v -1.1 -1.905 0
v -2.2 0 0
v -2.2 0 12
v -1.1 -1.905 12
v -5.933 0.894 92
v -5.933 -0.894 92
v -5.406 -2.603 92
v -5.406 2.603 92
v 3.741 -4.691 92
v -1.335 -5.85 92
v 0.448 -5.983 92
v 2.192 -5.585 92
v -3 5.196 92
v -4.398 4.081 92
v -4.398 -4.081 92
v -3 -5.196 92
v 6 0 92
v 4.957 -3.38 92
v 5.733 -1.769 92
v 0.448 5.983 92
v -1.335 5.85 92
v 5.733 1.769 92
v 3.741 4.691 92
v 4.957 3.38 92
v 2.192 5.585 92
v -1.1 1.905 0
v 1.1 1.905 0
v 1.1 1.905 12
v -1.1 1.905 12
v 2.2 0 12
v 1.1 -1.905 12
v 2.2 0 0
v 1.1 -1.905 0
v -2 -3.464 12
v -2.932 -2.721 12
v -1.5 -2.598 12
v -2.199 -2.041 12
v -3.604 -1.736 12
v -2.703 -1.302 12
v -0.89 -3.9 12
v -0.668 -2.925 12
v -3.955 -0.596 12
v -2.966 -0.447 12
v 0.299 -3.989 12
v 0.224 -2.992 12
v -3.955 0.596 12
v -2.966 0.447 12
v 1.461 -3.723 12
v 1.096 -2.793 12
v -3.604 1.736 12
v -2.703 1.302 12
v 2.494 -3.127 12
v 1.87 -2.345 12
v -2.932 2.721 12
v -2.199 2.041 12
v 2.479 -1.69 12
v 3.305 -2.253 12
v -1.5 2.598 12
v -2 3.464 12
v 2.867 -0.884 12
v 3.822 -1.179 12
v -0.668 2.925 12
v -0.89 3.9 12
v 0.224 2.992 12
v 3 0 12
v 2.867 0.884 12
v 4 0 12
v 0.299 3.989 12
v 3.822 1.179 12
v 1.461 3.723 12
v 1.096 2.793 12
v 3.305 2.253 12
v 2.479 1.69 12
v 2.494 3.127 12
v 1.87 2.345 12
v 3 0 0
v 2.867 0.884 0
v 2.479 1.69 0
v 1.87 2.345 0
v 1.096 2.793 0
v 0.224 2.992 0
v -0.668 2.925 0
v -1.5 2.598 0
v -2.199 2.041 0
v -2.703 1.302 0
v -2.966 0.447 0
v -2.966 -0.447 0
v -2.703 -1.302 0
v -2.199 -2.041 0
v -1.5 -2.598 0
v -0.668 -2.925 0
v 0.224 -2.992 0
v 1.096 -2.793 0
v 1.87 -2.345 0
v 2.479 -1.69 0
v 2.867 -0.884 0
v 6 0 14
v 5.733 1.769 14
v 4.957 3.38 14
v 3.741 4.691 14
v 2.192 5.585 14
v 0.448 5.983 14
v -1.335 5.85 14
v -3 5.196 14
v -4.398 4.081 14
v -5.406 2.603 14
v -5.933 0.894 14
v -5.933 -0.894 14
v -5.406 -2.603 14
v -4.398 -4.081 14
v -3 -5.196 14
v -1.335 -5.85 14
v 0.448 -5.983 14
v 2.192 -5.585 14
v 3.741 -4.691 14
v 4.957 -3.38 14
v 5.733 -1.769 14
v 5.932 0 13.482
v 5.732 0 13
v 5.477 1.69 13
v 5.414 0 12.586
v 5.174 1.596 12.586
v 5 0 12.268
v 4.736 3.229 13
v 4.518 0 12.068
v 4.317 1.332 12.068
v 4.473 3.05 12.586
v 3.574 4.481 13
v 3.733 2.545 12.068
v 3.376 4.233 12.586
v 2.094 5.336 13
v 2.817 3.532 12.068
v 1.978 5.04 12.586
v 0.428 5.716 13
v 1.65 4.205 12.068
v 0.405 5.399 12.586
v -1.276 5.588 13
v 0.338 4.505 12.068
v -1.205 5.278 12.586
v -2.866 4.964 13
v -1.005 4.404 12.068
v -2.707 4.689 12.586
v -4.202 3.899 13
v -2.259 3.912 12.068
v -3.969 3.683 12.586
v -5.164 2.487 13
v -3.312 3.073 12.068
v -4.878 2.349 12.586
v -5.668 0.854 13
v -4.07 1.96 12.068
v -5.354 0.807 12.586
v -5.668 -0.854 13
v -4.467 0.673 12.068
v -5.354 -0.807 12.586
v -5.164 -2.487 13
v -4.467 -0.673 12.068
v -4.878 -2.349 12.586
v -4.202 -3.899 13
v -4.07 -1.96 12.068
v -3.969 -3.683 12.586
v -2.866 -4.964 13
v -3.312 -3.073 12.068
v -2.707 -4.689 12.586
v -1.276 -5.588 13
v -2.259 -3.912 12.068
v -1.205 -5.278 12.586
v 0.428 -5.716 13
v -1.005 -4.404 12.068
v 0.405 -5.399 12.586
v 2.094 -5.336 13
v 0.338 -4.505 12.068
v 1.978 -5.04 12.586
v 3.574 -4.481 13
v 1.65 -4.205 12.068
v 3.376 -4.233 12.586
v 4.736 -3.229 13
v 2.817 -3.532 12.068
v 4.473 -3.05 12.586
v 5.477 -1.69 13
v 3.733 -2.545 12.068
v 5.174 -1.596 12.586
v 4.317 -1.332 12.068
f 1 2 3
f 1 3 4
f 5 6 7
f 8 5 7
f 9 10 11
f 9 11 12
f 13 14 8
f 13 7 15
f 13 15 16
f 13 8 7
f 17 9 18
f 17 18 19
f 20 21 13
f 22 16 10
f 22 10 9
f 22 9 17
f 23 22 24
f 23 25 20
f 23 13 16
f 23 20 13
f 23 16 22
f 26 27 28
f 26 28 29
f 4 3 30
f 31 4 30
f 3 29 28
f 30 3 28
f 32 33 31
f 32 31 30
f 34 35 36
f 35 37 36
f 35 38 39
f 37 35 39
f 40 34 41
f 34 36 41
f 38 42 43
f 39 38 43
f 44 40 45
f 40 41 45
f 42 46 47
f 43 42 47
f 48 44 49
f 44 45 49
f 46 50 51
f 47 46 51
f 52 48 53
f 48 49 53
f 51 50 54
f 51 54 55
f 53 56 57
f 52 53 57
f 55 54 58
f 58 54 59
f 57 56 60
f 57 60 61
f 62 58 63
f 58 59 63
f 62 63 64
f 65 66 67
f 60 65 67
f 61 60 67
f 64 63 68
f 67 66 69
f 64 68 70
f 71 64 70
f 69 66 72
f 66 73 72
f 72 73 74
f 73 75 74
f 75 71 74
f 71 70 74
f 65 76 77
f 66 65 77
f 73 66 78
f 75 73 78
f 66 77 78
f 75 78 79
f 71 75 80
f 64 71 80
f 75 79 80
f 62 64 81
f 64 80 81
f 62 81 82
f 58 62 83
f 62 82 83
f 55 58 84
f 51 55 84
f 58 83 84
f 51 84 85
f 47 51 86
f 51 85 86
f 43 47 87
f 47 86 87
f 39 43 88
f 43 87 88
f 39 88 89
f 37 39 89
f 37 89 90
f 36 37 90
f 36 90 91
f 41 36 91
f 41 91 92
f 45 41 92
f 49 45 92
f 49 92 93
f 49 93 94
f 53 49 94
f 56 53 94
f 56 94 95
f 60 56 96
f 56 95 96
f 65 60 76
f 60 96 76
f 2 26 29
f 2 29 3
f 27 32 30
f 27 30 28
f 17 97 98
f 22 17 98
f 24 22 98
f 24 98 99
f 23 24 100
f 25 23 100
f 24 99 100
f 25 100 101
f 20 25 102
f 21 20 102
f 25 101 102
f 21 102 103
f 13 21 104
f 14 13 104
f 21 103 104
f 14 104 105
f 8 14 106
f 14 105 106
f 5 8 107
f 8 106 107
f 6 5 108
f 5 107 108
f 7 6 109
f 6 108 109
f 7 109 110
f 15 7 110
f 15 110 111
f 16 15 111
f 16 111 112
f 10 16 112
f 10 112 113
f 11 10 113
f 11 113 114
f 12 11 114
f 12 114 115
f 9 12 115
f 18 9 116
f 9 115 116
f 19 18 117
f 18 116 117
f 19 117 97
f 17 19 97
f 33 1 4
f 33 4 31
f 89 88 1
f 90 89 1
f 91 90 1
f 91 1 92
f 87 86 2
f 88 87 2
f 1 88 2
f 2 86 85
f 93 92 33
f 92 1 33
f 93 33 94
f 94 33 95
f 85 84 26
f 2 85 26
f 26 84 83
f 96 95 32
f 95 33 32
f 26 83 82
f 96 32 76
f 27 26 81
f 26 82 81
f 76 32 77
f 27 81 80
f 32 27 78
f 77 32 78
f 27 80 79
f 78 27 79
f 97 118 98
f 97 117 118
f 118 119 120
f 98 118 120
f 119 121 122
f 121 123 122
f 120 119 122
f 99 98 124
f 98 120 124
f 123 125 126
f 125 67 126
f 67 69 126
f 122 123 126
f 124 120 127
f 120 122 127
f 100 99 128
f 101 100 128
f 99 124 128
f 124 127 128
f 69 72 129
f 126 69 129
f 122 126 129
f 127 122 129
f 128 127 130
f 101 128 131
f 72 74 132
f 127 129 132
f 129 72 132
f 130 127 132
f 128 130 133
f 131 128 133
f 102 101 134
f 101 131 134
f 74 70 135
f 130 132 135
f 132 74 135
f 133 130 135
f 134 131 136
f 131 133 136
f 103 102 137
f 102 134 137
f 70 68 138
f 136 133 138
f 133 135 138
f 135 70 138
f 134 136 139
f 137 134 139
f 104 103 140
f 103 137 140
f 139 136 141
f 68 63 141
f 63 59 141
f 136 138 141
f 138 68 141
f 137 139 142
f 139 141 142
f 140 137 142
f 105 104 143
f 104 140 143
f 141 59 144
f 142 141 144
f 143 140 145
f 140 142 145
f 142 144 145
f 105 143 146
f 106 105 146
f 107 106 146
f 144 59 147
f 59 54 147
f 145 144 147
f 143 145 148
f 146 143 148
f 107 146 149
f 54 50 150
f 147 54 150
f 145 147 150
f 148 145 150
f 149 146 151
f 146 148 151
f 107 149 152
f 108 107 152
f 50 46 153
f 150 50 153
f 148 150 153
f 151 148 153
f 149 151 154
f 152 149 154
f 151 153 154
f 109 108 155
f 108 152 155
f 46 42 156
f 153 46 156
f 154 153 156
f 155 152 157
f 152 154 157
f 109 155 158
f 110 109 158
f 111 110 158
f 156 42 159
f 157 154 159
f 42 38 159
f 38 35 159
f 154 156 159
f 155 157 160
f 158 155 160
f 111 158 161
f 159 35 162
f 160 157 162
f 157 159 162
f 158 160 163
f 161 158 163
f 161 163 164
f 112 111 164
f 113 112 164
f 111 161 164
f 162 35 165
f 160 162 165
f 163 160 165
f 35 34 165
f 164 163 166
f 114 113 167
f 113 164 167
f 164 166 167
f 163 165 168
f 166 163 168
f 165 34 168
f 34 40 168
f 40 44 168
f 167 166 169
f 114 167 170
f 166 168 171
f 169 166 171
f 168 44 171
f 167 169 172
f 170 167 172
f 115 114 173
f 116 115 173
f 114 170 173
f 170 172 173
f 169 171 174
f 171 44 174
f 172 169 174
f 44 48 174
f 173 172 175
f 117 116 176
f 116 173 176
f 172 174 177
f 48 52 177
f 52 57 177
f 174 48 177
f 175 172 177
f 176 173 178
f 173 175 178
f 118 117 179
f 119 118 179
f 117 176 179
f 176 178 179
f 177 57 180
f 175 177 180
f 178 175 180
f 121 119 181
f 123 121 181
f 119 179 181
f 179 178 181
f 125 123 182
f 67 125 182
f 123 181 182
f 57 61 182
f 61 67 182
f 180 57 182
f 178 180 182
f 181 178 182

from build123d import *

# Parameters (mm, degrees)
SKETCH_R     = 3
PAD_DEPTH    = 12
SKETCH001_R  = 6
PAD001_DEPTH = 80
FILLET_R     = 2


with BuildPart() as part:
    # Sketch → Pad (new body)
    with BuildSketch(Plane.XY):
        Circle(SKETCH_R)
        Polygon((2.2, 0), (1.1, 1.905256), (-1.1, 1.905256), (-2.2, 0), (-1.1, -1.905256), (1.1, -1.905256), align=None, mode=Mode.SUBTRACT)
    extrude(amount=PAD_DEPTH)

    # Sketch001 (on Face9 of Pad) → Pad001 (join)
    with BuildSketch(Plane.XY.offset(12)):
        Circle(SKETCH001_R)
    extrude(amount=PAD001_DEPTH)

    # Fillet
    fillet_edges = [part.edges().sort_by_distance(p)[0] for p in [
        (-6, 0, 12),
    ]]
    fillet(fillet_edges, radius=FILLET_R)


solid = part.part
